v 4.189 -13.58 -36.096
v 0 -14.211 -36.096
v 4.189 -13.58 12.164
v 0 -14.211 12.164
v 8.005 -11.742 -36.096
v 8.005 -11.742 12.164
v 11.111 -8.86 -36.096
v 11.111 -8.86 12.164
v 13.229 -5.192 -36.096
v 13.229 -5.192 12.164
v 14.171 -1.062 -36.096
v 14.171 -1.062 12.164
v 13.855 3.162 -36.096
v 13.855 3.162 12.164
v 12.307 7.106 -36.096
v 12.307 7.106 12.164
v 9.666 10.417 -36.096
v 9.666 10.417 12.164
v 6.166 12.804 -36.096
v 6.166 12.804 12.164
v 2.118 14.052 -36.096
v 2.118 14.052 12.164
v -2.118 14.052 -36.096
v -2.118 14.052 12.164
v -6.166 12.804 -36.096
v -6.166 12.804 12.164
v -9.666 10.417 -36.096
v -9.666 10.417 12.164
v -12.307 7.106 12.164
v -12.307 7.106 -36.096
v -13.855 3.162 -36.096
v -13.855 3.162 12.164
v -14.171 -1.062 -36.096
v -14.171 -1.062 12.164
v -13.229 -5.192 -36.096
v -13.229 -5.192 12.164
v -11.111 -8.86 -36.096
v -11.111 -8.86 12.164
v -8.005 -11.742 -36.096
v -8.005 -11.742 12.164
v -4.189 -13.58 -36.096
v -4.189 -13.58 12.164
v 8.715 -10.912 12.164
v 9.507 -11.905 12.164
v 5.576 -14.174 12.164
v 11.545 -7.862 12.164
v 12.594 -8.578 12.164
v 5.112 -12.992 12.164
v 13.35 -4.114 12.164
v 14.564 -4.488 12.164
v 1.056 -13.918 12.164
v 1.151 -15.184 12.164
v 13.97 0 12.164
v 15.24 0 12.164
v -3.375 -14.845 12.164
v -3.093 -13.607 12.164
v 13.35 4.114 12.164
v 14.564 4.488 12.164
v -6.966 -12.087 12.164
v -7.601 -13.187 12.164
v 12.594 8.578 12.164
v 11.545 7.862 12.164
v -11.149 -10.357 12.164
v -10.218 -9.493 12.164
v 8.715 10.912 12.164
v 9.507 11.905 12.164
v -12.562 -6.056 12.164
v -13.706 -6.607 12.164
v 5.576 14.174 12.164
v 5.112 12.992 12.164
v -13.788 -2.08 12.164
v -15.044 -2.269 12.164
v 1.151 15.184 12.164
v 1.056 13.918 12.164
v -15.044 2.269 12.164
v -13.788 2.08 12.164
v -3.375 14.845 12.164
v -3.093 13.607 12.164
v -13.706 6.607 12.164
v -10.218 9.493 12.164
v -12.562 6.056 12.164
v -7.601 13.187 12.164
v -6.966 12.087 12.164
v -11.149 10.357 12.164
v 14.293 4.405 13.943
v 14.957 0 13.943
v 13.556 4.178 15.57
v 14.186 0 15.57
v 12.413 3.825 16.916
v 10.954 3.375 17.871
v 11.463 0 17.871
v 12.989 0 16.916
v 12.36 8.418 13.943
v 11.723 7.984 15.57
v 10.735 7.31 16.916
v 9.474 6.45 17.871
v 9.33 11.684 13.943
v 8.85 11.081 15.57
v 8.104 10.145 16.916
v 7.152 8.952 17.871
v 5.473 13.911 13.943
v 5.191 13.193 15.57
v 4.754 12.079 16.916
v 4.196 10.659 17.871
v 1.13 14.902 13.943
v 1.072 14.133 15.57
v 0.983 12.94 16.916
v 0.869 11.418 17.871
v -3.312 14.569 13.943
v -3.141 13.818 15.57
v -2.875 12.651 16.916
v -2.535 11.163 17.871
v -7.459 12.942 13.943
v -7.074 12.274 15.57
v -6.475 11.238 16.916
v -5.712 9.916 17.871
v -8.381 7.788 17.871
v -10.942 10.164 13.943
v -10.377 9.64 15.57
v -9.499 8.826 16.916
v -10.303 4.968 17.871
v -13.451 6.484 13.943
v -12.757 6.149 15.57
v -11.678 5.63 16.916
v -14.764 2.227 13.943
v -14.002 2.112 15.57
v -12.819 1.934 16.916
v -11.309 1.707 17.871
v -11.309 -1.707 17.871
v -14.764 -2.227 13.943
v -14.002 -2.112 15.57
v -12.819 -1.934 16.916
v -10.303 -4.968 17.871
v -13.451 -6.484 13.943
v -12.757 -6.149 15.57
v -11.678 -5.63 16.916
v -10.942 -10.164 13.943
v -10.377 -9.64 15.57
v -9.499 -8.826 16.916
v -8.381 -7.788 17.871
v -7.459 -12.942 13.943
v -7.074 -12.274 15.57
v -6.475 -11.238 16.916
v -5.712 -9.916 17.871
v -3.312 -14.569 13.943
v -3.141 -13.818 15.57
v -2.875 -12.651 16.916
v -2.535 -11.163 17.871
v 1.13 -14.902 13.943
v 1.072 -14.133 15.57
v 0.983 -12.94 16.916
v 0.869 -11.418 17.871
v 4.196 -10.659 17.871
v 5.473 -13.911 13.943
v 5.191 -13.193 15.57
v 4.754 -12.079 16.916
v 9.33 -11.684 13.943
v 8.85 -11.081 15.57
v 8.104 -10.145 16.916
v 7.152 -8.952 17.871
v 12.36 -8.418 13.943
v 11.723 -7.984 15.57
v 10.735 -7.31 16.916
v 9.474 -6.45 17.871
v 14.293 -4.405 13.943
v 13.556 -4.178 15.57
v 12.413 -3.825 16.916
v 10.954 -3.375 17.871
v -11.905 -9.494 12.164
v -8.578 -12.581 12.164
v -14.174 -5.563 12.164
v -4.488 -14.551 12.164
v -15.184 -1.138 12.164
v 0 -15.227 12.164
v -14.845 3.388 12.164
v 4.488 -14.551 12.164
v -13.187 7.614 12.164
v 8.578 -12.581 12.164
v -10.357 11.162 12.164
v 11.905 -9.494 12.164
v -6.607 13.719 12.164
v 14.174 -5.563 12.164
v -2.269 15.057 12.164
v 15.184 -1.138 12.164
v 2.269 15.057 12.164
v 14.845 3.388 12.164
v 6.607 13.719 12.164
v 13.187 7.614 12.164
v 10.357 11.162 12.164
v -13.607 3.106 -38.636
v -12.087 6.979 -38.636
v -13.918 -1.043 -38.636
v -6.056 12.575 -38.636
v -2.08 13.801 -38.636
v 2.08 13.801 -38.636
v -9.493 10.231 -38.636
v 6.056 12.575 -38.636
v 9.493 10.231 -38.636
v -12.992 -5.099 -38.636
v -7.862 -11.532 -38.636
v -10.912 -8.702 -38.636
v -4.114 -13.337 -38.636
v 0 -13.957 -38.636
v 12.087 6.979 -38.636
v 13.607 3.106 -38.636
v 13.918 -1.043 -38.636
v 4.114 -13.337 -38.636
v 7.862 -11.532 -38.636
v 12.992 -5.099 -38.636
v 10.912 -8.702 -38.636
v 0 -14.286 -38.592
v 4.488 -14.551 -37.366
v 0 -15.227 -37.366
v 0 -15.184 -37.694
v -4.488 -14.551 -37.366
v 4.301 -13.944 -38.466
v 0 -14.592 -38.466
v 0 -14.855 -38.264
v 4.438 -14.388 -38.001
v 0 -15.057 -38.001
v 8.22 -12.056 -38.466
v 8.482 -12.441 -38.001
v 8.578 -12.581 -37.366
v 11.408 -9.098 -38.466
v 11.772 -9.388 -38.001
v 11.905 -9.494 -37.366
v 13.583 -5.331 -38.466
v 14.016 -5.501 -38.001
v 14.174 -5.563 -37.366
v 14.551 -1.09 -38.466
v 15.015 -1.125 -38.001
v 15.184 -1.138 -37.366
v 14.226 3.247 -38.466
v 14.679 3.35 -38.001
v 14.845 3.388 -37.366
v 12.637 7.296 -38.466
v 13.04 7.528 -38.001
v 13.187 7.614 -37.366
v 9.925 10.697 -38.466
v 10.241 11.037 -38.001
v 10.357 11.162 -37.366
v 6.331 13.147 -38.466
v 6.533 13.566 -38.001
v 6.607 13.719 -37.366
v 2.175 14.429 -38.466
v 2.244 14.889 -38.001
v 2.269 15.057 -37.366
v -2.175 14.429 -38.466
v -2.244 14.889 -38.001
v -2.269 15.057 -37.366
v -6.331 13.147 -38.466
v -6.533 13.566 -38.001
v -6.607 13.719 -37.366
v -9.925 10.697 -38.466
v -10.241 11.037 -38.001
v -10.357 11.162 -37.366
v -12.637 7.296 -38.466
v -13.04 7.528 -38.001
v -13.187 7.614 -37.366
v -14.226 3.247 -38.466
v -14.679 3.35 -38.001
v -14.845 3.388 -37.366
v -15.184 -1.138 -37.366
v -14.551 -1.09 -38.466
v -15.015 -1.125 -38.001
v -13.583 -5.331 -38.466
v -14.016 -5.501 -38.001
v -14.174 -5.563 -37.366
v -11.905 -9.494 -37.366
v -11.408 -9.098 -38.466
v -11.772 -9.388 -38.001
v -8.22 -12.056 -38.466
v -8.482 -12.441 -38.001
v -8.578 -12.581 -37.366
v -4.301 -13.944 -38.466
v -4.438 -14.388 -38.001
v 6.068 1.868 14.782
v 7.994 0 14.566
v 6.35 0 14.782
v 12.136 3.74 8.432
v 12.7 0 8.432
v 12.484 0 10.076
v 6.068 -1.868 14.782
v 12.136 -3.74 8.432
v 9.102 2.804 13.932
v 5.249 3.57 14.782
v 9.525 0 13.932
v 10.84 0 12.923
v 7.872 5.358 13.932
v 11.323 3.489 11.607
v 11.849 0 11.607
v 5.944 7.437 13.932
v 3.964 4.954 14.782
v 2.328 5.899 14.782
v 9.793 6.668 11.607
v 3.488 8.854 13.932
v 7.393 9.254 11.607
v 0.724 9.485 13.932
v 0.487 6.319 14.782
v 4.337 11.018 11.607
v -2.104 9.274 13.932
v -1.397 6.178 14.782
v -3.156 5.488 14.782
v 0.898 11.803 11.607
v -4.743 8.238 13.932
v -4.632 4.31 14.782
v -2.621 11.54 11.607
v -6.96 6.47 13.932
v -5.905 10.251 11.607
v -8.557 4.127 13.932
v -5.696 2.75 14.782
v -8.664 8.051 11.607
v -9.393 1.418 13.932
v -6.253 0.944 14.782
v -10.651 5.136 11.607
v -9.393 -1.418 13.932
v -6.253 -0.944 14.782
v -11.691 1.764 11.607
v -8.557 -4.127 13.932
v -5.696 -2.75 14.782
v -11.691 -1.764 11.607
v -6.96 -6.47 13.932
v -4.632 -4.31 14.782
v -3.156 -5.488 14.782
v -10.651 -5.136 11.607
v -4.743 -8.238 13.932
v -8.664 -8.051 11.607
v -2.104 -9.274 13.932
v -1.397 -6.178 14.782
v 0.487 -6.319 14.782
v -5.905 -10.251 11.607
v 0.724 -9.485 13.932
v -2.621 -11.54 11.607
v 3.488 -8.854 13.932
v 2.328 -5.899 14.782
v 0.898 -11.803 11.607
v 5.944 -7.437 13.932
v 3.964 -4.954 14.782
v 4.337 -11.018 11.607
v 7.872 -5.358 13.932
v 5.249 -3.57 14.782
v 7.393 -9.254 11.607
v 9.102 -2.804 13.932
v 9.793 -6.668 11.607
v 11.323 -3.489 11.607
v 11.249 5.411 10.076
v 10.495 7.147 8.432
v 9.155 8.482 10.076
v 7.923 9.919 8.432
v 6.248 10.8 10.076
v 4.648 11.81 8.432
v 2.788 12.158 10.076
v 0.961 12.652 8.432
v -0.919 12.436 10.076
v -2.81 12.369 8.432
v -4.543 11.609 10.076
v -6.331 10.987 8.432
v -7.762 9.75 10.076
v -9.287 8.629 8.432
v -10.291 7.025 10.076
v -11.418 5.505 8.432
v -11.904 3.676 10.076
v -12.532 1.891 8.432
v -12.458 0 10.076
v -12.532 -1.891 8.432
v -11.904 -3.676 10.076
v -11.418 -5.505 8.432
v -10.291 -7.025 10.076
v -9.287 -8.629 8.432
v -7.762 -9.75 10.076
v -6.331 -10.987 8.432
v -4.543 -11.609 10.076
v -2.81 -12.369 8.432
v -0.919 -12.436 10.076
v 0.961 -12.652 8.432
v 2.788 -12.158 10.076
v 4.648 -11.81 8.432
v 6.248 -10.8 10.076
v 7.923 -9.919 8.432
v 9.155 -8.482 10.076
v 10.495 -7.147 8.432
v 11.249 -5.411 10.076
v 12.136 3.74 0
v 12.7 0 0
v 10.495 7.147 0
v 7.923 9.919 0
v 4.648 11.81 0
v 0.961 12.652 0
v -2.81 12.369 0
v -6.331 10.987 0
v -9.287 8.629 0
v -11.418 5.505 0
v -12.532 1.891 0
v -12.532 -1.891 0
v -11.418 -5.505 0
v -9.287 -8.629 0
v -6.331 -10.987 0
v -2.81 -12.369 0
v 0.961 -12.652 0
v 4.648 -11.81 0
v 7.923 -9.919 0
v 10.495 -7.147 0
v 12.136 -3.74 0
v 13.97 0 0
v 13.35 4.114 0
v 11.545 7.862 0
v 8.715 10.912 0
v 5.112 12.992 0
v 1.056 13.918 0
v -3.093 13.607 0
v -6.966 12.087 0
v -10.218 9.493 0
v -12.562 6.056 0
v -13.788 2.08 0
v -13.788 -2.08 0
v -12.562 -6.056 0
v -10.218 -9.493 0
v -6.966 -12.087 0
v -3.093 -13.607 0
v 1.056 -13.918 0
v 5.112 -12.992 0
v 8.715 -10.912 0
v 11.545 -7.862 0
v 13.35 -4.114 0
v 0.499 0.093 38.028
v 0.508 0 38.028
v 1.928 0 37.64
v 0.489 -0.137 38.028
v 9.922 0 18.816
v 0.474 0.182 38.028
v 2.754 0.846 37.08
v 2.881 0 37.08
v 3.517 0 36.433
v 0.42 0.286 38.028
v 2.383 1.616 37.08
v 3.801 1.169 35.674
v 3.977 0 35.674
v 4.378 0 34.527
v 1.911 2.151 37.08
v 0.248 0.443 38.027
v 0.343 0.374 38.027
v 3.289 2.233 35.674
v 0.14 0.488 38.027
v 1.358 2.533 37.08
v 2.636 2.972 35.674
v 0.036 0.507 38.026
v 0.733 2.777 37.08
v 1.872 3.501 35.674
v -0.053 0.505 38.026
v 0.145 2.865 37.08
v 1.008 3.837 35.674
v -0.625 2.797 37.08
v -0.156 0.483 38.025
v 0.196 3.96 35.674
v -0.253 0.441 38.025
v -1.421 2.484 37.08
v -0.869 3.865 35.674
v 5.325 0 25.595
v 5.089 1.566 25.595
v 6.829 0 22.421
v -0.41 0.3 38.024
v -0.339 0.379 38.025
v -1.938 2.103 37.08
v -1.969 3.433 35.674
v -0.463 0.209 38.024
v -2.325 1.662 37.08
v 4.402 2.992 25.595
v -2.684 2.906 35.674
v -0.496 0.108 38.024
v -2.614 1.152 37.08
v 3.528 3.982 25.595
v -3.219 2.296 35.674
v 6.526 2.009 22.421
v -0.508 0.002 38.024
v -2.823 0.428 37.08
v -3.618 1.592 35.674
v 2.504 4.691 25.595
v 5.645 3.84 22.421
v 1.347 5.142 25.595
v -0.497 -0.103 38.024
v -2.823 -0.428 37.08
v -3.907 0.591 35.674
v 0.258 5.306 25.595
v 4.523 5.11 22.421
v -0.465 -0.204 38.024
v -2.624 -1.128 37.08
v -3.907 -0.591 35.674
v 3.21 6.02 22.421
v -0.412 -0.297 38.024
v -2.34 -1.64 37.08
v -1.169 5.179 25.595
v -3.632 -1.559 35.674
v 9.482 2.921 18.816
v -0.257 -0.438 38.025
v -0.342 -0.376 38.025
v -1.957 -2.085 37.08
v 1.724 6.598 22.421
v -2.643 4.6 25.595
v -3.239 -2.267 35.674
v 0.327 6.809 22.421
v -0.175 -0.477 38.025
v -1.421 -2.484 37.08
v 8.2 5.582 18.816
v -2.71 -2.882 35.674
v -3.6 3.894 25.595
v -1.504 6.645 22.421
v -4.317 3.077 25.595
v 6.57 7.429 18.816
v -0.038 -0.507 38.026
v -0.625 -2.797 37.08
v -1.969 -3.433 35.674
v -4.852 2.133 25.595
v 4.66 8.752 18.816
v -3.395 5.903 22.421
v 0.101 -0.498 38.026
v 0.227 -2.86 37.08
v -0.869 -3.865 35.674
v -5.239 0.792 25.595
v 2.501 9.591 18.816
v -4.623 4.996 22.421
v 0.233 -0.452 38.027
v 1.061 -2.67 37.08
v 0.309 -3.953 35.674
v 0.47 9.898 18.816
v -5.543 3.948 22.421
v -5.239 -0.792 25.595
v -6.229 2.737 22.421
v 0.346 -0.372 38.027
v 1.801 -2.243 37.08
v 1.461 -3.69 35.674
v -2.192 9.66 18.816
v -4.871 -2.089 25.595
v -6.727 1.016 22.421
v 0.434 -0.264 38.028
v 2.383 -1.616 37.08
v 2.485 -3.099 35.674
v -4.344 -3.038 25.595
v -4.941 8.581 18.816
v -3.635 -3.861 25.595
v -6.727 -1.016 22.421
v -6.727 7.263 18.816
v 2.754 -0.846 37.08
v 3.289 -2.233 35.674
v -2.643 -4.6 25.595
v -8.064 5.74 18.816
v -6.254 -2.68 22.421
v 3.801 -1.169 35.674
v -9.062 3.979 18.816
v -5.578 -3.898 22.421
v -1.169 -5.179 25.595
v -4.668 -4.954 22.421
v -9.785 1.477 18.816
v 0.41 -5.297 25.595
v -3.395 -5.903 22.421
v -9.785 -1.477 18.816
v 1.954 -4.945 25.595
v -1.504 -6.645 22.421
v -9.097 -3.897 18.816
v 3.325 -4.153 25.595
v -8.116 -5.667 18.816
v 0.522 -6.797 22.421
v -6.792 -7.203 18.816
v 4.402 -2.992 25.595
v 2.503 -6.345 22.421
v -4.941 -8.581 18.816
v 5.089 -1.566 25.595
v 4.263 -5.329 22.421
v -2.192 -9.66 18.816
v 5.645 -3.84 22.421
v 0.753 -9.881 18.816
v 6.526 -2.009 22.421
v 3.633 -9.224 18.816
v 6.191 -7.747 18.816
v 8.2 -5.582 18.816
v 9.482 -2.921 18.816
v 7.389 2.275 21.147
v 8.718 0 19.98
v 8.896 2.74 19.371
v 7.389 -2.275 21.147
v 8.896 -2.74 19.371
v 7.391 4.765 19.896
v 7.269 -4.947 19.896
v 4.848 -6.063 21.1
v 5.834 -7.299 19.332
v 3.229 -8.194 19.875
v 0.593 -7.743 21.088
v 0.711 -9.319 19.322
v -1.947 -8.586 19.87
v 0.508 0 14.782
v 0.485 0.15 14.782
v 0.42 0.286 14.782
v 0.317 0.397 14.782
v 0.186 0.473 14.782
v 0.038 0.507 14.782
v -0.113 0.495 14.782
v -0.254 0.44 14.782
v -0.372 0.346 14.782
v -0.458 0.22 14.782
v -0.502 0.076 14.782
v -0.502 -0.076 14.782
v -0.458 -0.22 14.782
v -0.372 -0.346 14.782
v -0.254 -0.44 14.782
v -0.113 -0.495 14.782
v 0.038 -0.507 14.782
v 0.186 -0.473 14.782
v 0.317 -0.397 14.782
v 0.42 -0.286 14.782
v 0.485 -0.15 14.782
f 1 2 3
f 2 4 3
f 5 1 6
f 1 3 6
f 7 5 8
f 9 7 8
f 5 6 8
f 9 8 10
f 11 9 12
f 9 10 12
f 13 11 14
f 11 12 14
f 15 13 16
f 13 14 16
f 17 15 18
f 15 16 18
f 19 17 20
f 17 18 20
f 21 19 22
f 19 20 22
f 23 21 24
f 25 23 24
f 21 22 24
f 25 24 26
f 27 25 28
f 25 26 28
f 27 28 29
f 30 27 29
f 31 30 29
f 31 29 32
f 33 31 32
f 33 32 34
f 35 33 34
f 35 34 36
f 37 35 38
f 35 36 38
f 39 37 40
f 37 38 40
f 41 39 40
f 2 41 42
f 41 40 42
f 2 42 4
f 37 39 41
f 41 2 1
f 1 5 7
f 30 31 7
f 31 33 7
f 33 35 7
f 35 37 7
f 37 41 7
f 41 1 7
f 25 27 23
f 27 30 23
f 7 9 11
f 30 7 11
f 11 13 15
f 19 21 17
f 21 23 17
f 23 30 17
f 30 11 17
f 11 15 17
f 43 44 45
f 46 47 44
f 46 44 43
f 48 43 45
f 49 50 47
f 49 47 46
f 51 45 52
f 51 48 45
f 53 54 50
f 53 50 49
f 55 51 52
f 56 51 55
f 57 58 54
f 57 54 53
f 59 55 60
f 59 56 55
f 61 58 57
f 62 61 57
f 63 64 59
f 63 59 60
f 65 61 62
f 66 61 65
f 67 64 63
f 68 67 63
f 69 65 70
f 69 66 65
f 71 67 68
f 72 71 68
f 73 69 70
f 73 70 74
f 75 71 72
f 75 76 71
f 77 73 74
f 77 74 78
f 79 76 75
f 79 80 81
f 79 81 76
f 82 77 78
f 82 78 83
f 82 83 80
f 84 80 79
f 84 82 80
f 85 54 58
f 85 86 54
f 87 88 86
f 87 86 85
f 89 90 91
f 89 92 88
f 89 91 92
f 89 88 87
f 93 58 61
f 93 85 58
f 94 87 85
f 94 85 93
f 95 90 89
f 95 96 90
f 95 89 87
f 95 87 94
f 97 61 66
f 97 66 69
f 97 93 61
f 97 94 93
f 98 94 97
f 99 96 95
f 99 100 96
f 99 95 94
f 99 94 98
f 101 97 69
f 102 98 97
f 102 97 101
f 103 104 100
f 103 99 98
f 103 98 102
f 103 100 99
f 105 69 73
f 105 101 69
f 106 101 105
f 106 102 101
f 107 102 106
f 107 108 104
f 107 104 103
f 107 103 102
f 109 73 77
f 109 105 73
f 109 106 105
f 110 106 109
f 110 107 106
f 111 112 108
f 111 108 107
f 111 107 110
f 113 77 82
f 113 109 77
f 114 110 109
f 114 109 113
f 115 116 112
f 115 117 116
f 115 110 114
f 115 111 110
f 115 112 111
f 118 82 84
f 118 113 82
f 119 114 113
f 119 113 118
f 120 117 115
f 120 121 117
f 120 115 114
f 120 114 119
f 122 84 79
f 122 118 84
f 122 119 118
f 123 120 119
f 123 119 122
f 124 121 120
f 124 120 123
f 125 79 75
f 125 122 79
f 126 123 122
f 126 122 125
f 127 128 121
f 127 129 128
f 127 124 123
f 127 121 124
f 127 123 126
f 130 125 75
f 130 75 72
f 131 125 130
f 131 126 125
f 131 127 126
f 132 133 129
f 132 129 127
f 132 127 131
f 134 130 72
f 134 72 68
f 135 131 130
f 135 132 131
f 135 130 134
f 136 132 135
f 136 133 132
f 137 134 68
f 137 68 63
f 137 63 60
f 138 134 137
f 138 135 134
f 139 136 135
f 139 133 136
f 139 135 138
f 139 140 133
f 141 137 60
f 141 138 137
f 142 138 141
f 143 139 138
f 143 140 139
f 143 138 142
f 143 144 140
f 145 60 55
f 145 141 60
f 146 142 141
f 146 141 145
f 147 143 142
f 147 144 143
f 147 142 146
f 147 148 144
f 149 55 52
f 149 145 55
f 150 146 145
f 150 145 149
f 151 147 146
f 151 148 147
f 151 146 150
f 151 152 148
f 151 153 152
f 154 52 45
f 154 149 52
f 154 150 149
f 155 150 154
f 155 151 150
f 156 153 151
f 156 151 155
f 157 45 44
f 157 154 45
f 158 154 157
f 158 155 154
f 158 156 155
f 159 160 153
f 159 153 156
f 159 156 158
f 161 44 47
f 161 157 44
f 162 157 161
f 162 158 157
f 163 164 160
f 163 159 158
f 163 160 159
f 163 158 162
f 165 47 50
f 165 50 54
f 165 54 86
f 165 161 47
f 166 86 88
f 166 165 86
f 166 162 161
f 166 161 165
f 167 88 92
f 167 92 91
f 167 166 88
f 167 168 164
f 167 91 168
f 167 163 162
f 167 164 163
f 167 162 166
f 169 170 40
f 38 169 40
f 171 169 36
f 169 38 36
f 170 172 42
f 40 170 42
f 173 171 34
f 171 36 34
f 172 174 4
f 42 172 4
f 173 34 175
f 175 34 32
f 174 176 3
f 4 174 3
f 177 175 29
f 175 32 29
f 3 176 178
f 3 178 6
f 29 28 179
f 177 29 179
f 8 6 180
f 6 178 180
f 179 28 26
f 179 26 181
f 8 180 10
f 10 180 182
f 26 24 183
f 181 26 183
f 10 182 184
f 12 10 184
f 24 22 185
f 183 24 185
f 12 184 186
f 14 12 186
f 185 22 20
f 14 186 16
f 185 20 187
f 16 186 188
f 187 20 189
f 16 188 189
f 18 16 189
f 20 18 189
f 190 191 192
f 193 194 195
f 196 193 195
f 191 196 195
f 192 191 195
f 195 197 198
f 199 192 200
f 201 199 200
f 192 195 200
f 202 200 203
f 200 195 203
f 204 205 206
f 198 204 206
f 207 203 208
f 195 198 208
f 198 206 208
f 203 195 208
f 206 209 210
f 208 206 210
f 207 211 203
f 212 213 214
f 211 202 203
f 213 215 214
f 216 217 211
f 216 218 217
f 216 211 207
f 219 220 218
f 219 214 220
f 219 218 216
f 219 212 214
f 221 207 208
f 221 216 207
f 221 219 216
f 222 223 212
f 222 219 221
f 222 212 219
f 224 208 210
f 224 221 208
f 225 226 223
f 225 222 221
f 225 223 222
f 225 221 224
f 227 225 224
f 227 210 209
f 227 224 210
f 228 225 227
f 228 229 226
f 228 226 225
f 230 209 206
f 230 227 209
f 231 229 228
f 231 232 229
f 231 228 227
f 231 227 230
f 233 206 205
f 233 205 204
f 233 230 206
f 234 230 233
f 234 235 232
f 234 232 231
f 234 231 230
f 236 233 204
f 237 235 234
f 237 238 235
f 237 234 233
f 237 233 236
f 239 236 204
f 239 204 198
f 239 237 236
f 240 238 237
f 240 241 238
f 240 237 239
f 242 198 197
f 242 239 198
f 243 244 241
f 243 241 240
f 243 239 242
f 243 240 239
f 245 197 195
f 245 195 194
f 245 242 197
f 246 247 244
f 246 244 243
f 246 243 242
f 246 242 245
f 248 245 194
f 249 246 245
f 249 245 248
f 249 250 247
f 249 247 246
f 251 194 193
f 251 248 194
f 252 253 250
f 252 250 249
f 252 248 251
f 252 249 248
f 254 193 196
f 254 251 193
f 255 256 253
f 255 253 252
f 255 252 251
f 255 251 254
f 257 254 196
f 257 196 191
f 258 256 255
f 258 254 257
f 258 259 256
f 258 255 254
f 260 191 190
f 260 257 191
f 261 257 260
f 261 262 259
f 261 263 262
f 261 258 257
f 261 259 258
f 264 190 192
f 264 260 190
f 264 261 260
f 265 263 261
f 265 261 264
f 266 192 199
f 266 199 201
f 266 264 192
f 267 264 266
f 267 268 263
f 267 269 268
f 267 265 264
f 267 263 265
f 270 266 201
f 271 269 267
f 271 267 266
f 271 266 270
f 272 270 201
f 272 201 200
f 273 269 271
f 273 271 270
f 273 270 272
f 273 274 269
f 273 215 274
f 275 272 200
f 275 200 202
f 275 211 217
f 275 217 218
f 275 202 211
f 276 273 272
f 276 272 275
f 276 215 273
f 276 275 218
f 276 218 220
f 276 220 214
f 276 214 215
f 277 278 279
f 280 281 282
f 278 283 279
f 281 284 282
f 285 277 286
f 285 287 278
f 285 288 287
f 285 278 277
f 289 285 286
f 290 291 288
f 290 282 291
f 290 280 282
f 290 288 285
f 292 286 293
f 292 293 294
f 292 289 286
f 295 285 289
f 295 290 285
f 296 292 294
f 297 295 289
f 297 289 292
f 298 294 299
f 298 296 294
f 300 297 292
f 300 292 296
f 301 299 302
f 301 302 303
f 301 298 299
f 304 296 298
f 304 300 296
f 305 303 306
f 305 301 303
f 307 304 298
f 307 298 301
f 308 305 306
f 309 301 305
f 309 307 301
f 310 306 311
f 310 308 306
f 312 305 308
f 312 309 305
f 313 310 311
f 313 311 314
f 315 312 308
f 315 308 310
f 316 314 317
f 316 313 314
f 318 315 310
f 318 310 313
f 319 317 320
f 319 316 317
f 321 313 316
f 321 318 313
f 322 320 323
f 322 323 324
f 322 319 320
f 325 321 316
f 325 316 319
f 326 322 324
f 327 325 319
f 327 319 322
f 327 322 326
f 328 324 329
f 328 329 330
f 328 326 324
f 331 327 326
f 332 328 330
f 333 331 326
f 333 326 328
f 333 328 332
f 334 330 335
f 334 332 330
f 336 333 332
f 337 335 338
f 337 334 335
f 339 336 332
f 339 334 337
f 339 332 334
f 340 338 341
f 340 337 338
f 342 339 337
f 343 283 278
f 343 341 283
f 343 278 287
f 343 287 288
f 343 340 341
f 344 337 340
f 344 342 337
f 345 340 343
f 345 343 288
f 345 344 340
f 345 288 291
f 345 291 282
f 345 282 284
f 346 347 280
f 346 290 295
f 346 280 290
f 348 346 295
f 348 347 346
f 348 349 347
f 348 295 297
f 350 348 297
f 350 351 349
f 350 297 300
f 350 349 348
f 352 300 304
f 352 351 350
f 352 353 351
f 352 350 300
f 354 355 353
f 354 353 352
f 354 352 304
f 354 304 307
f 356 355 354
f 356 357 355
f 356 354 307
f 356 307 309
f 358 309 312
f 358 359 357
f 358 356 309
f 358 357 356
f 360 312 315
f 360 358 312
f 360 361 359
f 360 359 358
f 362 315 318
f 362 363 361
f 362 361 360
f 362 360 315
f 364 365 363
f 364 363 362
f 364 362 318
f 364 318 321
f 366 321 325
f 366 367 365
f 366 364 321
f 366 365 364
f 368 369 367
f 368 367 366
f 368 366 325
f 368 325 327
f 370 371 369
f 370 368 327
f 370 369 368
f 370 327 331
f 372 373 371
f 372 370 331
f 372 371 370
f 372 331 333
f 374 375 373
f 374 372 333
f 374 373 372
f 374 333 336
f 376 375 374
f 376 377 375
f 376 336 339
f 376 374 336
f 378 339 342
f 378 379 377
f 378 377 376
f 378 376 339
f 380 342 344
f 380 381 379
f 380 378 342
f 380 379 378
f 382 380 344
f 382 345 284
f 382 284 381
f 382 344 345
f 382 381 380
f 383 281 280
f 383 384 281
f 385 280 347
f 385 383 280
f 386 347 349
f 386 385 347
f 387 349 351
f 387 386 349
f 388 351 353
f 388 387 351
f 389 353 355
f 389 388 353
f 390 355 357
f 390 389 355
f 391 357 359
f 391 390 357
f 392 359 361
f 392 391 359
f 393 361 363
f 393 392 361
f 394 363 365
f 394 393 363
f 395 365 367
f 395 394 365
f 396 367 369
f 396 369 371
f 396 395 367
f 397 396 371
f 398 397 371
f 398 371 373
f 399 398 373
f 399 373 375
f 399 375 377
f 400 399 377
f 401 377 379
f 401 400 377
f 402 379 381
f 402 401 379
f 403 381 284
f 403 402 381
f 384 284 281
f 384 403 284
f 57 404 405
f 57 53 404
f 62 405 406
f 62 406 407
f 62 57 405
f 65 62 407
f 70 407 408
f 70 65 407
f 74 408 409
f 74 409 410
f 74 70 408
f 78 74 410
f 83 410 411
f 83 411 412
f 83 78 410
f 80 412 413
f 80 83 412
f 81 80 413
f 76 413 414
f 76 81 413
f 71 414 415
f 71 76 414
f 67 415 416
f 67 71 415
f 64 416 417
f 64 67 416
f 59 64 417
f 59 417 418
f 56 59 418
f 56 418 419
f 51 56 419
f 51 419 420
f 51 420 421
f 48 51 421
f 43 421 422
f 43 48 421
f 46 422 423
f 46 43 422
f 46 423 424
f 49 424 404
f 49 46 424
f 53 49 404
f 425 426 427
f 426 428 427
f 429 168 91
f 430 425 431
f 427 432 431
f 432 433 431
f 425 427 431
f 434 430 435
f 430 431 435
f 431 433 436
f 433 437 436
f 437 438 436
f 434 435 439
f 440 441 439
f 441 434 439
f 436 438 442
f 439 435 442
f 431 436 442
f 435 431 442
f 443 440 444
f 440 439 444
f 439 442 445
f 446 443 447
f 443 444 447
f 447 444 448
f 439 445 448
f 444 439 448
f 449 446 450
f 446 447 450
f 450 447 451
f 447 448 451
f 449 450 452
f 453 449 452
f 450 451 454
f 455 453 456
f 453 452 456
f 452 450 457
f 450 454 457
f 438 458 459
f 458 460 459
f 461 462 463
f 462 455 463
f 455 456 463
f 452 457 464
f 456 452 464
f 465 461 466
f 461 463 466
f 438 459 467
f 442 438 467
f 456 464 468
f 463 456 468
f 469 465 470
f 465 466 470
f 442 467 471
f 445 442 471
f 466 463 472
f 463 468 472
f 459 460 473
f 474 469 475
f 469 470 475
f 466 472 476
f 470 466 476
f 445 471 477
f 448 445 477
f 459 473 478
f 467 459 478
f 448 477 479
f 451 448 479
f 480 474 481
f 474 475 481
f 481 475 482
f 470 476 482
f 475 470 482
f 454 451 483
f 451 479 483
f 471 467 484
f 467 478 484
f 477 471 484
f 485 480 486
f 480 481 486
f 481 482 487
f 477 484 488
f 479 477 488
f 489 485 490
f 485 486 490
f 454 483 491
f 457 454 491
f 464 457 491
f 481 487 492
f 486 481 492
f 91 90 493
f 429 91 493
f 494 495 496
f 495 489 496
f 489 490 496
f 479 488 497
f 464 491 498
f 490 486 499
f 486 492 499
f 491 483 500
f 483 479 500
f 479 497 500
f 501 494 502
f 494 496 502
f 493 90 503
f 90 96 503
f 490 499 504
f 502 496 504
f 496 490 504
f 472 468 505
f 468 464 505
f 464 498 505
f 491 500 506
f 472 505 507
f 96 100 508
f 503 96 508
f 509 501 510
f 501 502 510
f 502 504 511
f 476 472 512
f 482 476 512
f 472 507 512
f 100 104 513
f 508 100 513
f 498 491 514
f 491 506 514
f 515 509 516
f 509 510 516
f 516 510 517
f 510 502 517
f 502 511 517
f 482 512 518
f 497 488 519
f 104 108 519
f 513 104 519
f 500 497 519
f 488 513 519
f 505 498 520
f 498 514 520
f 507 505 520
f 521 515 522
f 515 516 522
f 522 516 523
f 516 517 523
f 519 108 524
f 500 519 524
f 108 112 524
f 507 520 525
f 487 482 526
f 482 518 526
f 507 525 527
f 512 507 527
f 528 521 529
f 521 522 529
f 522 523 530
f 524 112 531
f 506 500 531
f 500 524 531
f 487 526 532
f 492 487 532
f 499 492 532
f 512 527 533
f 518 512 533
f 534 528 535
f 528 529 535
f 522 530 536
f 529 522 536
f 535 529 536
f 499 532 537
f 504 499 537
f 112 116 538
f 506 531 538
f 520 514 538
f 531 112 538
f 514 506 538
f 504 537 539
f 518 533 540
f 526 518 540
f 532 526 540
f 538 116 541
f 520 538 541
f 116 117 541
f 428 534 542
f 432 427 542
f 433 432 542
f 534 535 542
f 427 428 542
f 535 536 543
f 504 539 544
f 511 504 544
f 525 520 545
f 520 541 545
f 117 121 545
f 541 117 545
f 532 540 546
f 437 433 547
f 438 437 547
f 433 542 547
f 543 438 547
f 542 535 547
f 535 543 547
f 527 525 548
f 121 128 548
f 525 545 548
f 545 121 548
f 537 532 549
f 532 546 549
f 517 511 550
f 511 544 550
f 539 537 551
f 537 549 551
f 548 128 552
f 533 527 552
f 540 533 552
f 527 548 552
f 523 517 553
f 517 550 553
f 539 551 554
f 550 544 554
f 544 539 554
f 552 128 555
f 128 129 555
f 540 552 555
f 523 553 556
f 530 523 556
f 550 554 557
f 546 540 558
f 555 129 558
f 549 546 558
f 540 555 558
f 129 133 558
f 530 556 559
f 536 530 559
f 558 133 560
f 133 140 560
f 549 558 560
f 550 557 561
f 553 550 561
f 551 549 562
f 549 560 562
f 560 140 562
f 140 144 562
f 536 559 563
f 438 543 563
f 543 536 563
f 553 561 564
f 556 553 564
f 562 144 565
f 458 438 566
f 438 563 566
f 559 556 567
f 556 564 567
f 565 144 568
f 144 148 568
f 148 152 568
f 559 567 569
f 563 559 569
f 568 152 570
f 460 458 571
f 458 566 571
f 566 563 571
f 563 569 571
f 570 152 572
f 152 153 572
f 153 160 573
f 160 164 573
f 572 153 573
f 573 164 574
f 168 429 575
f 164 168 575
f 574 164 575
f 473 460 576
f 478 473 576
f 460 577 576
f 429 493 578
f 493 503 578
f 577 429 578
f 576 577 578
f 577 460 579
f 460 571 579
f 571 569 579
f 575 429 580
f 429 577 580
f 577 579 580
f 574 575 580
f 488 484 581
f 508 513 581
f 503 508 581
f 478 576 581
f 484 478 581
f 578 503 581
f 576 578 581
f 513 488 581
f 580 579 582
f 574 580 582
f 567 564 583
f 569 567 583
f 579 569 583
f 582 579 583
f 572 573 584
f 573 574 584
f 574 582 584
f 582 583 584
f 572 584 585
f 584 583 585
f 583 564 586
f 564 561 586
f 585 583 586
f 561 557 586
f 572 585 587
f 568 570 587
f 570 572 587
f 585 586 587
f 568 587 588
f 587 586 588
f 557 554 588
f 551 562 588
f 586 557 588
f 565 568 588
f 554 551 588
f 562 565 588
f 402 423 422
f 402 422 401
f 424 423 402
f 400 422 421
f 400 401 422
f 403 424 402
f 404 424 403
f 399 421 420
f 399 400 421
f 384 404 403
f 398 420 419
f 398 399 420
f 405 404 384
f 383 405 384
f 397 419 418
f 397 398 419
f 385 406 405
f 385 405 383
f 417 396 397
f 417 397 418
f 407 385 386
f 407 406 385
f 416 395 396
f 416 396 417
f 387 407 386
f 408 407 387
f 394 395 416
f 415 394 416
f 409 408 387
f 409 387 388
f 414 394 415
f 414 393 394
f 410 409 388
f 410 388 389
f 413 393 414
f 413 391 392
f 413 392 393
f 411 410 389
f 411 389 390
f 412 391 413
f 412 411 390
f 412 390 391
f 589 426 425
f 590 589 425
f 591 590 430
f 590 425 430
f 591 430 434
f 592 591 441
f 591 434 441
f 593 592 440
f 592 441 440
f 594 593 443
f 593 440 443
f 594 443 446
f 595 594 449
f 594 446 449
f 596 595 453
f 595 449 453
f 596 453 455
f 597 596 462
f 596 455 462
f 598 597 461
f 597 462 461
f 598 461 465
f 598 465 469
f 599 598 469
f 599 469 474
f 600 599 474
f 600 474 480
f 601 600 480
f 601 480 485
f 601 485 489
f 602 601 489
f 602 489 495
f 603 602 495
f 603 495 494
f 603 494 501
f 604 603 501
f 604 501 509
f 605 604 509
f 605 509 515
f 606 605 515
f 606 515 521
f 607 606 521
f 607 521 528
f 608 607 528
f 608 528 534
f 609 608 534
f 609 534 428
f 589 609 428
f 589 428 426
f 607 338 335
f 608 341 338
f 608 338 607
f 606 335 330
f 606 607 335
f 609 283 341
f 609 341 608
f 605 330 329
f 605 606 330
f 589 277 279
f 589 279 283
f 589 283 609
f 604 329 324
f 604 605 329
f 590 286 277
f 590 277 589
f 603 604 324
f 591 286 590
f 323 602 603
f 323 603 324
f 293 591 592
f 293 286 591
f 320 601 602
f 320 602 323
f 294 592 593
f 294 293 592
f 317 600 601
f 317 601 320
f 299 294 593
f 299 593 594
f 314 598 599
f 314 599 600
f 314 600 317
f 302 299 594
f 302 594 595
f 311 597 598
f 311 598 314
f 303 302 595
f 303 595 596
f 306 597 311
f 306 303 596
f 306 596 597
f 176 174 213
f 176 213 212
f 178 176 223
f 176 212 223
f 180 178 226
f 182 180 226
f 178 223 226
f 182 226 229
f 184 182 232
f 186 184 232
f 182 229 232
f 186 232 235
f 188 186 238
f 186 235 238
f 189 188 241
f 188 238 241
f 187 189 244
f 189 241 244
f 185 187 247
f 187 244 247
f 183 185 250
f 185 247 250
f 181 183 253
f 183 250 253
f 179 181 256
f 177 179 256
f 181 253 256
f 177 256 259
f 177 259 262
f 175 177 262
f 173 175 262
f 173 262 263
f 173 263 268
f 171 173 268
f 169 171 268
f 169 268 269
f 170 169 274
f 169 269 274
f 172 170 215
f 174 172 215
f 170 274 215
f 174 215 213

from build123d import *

# Parameters (mm, degrees)
F4_R     = 1.27
F6_R     = 0.508
F7_DEPTH = 2540


with BuildPart() as f1:
    # F0 (on Front) → F1 (revolve)
    with BuildSketch(Plane.XZ):
        with BuildLine():
            Line((0.0129888206, 38.0891347453), (0.0129888206, 14.7824911401))
            Line((0.0129888206, 14.7824911401), (6.35, 14.7824911401))
            ThreePointArc((6.35, 14.7824911401), (10.8401280605, 12.9226192006), (12.7, 8.4324911401))
            Line((12.7, 8.4324911401), (12.7, 0))
            Line((12.7, 0), (13.97, 0))
            Line((13.97, 0), (13.97, 12.1643003333))
            Line((13.97, 12.1643003333), (15.24, 12.1643003333))
            ThreePointArc((15.24, 12.1643003333), (14.1861096276, 15.570023473), (11.4631301434, 17.8711140296))
            add(Edge.make_bspline(
                [(0.0129888206, 38.0891347453), (3.2375221603, 37.7856792591), (5.1139625625, 34.0491835059), (4.5409913214, 26.8386946553), (6.510569033, 22.5911322118), (8.9457915552, 19.5750505607), (10.5066207336, 18.2949238879), (11.4631301434, 17.8711140296)],
                knots=[0, 0, 0, 0, 0.2090800805, 0.4310776593, 0.6112256598, 0.7817355895, 0.8922493546, 0.8922493546, 0.8922493546, 0.8922493546], degree=3))
        make_face()
    revolve(axis=Axis((0.0129888206, 0, 26.4358129427), (0, 0, 1)))

    # F6 (on offset) → F7 (cut)
    with BuildSketch(Plane.XY.offset(38.1)):
        Circle(F6_R)
    extrude(amount=-F7_DEPTH, mode=Mode.SUBTRACT)


with BuildPart() as f3:
    # F2 (on Right) → F3 (revolve)
    with BuildSketch(Plane.YZ):
        Polygon((-15.2270111794, -38.6356996667), (0, -38.6356996667), (0, -36.0956996667), (-14.2110111794, -36.0956996667), (-14.2110111794, 12.1643003333), (-15.2270111794, 12.1643003333), align=None)
    revolve(axis=Axis((0, 0, -37.3656996667), (0, 0, 1)))

    # F4
    f4_edges = [f3.edges().sort_by_distance(p)[0] for p in [
        (0, 15.227011, -38.6357),
    ]]
    fillet(f4_edges, radius=F4_R)


solid = Compound([f1.part, f3.part])
